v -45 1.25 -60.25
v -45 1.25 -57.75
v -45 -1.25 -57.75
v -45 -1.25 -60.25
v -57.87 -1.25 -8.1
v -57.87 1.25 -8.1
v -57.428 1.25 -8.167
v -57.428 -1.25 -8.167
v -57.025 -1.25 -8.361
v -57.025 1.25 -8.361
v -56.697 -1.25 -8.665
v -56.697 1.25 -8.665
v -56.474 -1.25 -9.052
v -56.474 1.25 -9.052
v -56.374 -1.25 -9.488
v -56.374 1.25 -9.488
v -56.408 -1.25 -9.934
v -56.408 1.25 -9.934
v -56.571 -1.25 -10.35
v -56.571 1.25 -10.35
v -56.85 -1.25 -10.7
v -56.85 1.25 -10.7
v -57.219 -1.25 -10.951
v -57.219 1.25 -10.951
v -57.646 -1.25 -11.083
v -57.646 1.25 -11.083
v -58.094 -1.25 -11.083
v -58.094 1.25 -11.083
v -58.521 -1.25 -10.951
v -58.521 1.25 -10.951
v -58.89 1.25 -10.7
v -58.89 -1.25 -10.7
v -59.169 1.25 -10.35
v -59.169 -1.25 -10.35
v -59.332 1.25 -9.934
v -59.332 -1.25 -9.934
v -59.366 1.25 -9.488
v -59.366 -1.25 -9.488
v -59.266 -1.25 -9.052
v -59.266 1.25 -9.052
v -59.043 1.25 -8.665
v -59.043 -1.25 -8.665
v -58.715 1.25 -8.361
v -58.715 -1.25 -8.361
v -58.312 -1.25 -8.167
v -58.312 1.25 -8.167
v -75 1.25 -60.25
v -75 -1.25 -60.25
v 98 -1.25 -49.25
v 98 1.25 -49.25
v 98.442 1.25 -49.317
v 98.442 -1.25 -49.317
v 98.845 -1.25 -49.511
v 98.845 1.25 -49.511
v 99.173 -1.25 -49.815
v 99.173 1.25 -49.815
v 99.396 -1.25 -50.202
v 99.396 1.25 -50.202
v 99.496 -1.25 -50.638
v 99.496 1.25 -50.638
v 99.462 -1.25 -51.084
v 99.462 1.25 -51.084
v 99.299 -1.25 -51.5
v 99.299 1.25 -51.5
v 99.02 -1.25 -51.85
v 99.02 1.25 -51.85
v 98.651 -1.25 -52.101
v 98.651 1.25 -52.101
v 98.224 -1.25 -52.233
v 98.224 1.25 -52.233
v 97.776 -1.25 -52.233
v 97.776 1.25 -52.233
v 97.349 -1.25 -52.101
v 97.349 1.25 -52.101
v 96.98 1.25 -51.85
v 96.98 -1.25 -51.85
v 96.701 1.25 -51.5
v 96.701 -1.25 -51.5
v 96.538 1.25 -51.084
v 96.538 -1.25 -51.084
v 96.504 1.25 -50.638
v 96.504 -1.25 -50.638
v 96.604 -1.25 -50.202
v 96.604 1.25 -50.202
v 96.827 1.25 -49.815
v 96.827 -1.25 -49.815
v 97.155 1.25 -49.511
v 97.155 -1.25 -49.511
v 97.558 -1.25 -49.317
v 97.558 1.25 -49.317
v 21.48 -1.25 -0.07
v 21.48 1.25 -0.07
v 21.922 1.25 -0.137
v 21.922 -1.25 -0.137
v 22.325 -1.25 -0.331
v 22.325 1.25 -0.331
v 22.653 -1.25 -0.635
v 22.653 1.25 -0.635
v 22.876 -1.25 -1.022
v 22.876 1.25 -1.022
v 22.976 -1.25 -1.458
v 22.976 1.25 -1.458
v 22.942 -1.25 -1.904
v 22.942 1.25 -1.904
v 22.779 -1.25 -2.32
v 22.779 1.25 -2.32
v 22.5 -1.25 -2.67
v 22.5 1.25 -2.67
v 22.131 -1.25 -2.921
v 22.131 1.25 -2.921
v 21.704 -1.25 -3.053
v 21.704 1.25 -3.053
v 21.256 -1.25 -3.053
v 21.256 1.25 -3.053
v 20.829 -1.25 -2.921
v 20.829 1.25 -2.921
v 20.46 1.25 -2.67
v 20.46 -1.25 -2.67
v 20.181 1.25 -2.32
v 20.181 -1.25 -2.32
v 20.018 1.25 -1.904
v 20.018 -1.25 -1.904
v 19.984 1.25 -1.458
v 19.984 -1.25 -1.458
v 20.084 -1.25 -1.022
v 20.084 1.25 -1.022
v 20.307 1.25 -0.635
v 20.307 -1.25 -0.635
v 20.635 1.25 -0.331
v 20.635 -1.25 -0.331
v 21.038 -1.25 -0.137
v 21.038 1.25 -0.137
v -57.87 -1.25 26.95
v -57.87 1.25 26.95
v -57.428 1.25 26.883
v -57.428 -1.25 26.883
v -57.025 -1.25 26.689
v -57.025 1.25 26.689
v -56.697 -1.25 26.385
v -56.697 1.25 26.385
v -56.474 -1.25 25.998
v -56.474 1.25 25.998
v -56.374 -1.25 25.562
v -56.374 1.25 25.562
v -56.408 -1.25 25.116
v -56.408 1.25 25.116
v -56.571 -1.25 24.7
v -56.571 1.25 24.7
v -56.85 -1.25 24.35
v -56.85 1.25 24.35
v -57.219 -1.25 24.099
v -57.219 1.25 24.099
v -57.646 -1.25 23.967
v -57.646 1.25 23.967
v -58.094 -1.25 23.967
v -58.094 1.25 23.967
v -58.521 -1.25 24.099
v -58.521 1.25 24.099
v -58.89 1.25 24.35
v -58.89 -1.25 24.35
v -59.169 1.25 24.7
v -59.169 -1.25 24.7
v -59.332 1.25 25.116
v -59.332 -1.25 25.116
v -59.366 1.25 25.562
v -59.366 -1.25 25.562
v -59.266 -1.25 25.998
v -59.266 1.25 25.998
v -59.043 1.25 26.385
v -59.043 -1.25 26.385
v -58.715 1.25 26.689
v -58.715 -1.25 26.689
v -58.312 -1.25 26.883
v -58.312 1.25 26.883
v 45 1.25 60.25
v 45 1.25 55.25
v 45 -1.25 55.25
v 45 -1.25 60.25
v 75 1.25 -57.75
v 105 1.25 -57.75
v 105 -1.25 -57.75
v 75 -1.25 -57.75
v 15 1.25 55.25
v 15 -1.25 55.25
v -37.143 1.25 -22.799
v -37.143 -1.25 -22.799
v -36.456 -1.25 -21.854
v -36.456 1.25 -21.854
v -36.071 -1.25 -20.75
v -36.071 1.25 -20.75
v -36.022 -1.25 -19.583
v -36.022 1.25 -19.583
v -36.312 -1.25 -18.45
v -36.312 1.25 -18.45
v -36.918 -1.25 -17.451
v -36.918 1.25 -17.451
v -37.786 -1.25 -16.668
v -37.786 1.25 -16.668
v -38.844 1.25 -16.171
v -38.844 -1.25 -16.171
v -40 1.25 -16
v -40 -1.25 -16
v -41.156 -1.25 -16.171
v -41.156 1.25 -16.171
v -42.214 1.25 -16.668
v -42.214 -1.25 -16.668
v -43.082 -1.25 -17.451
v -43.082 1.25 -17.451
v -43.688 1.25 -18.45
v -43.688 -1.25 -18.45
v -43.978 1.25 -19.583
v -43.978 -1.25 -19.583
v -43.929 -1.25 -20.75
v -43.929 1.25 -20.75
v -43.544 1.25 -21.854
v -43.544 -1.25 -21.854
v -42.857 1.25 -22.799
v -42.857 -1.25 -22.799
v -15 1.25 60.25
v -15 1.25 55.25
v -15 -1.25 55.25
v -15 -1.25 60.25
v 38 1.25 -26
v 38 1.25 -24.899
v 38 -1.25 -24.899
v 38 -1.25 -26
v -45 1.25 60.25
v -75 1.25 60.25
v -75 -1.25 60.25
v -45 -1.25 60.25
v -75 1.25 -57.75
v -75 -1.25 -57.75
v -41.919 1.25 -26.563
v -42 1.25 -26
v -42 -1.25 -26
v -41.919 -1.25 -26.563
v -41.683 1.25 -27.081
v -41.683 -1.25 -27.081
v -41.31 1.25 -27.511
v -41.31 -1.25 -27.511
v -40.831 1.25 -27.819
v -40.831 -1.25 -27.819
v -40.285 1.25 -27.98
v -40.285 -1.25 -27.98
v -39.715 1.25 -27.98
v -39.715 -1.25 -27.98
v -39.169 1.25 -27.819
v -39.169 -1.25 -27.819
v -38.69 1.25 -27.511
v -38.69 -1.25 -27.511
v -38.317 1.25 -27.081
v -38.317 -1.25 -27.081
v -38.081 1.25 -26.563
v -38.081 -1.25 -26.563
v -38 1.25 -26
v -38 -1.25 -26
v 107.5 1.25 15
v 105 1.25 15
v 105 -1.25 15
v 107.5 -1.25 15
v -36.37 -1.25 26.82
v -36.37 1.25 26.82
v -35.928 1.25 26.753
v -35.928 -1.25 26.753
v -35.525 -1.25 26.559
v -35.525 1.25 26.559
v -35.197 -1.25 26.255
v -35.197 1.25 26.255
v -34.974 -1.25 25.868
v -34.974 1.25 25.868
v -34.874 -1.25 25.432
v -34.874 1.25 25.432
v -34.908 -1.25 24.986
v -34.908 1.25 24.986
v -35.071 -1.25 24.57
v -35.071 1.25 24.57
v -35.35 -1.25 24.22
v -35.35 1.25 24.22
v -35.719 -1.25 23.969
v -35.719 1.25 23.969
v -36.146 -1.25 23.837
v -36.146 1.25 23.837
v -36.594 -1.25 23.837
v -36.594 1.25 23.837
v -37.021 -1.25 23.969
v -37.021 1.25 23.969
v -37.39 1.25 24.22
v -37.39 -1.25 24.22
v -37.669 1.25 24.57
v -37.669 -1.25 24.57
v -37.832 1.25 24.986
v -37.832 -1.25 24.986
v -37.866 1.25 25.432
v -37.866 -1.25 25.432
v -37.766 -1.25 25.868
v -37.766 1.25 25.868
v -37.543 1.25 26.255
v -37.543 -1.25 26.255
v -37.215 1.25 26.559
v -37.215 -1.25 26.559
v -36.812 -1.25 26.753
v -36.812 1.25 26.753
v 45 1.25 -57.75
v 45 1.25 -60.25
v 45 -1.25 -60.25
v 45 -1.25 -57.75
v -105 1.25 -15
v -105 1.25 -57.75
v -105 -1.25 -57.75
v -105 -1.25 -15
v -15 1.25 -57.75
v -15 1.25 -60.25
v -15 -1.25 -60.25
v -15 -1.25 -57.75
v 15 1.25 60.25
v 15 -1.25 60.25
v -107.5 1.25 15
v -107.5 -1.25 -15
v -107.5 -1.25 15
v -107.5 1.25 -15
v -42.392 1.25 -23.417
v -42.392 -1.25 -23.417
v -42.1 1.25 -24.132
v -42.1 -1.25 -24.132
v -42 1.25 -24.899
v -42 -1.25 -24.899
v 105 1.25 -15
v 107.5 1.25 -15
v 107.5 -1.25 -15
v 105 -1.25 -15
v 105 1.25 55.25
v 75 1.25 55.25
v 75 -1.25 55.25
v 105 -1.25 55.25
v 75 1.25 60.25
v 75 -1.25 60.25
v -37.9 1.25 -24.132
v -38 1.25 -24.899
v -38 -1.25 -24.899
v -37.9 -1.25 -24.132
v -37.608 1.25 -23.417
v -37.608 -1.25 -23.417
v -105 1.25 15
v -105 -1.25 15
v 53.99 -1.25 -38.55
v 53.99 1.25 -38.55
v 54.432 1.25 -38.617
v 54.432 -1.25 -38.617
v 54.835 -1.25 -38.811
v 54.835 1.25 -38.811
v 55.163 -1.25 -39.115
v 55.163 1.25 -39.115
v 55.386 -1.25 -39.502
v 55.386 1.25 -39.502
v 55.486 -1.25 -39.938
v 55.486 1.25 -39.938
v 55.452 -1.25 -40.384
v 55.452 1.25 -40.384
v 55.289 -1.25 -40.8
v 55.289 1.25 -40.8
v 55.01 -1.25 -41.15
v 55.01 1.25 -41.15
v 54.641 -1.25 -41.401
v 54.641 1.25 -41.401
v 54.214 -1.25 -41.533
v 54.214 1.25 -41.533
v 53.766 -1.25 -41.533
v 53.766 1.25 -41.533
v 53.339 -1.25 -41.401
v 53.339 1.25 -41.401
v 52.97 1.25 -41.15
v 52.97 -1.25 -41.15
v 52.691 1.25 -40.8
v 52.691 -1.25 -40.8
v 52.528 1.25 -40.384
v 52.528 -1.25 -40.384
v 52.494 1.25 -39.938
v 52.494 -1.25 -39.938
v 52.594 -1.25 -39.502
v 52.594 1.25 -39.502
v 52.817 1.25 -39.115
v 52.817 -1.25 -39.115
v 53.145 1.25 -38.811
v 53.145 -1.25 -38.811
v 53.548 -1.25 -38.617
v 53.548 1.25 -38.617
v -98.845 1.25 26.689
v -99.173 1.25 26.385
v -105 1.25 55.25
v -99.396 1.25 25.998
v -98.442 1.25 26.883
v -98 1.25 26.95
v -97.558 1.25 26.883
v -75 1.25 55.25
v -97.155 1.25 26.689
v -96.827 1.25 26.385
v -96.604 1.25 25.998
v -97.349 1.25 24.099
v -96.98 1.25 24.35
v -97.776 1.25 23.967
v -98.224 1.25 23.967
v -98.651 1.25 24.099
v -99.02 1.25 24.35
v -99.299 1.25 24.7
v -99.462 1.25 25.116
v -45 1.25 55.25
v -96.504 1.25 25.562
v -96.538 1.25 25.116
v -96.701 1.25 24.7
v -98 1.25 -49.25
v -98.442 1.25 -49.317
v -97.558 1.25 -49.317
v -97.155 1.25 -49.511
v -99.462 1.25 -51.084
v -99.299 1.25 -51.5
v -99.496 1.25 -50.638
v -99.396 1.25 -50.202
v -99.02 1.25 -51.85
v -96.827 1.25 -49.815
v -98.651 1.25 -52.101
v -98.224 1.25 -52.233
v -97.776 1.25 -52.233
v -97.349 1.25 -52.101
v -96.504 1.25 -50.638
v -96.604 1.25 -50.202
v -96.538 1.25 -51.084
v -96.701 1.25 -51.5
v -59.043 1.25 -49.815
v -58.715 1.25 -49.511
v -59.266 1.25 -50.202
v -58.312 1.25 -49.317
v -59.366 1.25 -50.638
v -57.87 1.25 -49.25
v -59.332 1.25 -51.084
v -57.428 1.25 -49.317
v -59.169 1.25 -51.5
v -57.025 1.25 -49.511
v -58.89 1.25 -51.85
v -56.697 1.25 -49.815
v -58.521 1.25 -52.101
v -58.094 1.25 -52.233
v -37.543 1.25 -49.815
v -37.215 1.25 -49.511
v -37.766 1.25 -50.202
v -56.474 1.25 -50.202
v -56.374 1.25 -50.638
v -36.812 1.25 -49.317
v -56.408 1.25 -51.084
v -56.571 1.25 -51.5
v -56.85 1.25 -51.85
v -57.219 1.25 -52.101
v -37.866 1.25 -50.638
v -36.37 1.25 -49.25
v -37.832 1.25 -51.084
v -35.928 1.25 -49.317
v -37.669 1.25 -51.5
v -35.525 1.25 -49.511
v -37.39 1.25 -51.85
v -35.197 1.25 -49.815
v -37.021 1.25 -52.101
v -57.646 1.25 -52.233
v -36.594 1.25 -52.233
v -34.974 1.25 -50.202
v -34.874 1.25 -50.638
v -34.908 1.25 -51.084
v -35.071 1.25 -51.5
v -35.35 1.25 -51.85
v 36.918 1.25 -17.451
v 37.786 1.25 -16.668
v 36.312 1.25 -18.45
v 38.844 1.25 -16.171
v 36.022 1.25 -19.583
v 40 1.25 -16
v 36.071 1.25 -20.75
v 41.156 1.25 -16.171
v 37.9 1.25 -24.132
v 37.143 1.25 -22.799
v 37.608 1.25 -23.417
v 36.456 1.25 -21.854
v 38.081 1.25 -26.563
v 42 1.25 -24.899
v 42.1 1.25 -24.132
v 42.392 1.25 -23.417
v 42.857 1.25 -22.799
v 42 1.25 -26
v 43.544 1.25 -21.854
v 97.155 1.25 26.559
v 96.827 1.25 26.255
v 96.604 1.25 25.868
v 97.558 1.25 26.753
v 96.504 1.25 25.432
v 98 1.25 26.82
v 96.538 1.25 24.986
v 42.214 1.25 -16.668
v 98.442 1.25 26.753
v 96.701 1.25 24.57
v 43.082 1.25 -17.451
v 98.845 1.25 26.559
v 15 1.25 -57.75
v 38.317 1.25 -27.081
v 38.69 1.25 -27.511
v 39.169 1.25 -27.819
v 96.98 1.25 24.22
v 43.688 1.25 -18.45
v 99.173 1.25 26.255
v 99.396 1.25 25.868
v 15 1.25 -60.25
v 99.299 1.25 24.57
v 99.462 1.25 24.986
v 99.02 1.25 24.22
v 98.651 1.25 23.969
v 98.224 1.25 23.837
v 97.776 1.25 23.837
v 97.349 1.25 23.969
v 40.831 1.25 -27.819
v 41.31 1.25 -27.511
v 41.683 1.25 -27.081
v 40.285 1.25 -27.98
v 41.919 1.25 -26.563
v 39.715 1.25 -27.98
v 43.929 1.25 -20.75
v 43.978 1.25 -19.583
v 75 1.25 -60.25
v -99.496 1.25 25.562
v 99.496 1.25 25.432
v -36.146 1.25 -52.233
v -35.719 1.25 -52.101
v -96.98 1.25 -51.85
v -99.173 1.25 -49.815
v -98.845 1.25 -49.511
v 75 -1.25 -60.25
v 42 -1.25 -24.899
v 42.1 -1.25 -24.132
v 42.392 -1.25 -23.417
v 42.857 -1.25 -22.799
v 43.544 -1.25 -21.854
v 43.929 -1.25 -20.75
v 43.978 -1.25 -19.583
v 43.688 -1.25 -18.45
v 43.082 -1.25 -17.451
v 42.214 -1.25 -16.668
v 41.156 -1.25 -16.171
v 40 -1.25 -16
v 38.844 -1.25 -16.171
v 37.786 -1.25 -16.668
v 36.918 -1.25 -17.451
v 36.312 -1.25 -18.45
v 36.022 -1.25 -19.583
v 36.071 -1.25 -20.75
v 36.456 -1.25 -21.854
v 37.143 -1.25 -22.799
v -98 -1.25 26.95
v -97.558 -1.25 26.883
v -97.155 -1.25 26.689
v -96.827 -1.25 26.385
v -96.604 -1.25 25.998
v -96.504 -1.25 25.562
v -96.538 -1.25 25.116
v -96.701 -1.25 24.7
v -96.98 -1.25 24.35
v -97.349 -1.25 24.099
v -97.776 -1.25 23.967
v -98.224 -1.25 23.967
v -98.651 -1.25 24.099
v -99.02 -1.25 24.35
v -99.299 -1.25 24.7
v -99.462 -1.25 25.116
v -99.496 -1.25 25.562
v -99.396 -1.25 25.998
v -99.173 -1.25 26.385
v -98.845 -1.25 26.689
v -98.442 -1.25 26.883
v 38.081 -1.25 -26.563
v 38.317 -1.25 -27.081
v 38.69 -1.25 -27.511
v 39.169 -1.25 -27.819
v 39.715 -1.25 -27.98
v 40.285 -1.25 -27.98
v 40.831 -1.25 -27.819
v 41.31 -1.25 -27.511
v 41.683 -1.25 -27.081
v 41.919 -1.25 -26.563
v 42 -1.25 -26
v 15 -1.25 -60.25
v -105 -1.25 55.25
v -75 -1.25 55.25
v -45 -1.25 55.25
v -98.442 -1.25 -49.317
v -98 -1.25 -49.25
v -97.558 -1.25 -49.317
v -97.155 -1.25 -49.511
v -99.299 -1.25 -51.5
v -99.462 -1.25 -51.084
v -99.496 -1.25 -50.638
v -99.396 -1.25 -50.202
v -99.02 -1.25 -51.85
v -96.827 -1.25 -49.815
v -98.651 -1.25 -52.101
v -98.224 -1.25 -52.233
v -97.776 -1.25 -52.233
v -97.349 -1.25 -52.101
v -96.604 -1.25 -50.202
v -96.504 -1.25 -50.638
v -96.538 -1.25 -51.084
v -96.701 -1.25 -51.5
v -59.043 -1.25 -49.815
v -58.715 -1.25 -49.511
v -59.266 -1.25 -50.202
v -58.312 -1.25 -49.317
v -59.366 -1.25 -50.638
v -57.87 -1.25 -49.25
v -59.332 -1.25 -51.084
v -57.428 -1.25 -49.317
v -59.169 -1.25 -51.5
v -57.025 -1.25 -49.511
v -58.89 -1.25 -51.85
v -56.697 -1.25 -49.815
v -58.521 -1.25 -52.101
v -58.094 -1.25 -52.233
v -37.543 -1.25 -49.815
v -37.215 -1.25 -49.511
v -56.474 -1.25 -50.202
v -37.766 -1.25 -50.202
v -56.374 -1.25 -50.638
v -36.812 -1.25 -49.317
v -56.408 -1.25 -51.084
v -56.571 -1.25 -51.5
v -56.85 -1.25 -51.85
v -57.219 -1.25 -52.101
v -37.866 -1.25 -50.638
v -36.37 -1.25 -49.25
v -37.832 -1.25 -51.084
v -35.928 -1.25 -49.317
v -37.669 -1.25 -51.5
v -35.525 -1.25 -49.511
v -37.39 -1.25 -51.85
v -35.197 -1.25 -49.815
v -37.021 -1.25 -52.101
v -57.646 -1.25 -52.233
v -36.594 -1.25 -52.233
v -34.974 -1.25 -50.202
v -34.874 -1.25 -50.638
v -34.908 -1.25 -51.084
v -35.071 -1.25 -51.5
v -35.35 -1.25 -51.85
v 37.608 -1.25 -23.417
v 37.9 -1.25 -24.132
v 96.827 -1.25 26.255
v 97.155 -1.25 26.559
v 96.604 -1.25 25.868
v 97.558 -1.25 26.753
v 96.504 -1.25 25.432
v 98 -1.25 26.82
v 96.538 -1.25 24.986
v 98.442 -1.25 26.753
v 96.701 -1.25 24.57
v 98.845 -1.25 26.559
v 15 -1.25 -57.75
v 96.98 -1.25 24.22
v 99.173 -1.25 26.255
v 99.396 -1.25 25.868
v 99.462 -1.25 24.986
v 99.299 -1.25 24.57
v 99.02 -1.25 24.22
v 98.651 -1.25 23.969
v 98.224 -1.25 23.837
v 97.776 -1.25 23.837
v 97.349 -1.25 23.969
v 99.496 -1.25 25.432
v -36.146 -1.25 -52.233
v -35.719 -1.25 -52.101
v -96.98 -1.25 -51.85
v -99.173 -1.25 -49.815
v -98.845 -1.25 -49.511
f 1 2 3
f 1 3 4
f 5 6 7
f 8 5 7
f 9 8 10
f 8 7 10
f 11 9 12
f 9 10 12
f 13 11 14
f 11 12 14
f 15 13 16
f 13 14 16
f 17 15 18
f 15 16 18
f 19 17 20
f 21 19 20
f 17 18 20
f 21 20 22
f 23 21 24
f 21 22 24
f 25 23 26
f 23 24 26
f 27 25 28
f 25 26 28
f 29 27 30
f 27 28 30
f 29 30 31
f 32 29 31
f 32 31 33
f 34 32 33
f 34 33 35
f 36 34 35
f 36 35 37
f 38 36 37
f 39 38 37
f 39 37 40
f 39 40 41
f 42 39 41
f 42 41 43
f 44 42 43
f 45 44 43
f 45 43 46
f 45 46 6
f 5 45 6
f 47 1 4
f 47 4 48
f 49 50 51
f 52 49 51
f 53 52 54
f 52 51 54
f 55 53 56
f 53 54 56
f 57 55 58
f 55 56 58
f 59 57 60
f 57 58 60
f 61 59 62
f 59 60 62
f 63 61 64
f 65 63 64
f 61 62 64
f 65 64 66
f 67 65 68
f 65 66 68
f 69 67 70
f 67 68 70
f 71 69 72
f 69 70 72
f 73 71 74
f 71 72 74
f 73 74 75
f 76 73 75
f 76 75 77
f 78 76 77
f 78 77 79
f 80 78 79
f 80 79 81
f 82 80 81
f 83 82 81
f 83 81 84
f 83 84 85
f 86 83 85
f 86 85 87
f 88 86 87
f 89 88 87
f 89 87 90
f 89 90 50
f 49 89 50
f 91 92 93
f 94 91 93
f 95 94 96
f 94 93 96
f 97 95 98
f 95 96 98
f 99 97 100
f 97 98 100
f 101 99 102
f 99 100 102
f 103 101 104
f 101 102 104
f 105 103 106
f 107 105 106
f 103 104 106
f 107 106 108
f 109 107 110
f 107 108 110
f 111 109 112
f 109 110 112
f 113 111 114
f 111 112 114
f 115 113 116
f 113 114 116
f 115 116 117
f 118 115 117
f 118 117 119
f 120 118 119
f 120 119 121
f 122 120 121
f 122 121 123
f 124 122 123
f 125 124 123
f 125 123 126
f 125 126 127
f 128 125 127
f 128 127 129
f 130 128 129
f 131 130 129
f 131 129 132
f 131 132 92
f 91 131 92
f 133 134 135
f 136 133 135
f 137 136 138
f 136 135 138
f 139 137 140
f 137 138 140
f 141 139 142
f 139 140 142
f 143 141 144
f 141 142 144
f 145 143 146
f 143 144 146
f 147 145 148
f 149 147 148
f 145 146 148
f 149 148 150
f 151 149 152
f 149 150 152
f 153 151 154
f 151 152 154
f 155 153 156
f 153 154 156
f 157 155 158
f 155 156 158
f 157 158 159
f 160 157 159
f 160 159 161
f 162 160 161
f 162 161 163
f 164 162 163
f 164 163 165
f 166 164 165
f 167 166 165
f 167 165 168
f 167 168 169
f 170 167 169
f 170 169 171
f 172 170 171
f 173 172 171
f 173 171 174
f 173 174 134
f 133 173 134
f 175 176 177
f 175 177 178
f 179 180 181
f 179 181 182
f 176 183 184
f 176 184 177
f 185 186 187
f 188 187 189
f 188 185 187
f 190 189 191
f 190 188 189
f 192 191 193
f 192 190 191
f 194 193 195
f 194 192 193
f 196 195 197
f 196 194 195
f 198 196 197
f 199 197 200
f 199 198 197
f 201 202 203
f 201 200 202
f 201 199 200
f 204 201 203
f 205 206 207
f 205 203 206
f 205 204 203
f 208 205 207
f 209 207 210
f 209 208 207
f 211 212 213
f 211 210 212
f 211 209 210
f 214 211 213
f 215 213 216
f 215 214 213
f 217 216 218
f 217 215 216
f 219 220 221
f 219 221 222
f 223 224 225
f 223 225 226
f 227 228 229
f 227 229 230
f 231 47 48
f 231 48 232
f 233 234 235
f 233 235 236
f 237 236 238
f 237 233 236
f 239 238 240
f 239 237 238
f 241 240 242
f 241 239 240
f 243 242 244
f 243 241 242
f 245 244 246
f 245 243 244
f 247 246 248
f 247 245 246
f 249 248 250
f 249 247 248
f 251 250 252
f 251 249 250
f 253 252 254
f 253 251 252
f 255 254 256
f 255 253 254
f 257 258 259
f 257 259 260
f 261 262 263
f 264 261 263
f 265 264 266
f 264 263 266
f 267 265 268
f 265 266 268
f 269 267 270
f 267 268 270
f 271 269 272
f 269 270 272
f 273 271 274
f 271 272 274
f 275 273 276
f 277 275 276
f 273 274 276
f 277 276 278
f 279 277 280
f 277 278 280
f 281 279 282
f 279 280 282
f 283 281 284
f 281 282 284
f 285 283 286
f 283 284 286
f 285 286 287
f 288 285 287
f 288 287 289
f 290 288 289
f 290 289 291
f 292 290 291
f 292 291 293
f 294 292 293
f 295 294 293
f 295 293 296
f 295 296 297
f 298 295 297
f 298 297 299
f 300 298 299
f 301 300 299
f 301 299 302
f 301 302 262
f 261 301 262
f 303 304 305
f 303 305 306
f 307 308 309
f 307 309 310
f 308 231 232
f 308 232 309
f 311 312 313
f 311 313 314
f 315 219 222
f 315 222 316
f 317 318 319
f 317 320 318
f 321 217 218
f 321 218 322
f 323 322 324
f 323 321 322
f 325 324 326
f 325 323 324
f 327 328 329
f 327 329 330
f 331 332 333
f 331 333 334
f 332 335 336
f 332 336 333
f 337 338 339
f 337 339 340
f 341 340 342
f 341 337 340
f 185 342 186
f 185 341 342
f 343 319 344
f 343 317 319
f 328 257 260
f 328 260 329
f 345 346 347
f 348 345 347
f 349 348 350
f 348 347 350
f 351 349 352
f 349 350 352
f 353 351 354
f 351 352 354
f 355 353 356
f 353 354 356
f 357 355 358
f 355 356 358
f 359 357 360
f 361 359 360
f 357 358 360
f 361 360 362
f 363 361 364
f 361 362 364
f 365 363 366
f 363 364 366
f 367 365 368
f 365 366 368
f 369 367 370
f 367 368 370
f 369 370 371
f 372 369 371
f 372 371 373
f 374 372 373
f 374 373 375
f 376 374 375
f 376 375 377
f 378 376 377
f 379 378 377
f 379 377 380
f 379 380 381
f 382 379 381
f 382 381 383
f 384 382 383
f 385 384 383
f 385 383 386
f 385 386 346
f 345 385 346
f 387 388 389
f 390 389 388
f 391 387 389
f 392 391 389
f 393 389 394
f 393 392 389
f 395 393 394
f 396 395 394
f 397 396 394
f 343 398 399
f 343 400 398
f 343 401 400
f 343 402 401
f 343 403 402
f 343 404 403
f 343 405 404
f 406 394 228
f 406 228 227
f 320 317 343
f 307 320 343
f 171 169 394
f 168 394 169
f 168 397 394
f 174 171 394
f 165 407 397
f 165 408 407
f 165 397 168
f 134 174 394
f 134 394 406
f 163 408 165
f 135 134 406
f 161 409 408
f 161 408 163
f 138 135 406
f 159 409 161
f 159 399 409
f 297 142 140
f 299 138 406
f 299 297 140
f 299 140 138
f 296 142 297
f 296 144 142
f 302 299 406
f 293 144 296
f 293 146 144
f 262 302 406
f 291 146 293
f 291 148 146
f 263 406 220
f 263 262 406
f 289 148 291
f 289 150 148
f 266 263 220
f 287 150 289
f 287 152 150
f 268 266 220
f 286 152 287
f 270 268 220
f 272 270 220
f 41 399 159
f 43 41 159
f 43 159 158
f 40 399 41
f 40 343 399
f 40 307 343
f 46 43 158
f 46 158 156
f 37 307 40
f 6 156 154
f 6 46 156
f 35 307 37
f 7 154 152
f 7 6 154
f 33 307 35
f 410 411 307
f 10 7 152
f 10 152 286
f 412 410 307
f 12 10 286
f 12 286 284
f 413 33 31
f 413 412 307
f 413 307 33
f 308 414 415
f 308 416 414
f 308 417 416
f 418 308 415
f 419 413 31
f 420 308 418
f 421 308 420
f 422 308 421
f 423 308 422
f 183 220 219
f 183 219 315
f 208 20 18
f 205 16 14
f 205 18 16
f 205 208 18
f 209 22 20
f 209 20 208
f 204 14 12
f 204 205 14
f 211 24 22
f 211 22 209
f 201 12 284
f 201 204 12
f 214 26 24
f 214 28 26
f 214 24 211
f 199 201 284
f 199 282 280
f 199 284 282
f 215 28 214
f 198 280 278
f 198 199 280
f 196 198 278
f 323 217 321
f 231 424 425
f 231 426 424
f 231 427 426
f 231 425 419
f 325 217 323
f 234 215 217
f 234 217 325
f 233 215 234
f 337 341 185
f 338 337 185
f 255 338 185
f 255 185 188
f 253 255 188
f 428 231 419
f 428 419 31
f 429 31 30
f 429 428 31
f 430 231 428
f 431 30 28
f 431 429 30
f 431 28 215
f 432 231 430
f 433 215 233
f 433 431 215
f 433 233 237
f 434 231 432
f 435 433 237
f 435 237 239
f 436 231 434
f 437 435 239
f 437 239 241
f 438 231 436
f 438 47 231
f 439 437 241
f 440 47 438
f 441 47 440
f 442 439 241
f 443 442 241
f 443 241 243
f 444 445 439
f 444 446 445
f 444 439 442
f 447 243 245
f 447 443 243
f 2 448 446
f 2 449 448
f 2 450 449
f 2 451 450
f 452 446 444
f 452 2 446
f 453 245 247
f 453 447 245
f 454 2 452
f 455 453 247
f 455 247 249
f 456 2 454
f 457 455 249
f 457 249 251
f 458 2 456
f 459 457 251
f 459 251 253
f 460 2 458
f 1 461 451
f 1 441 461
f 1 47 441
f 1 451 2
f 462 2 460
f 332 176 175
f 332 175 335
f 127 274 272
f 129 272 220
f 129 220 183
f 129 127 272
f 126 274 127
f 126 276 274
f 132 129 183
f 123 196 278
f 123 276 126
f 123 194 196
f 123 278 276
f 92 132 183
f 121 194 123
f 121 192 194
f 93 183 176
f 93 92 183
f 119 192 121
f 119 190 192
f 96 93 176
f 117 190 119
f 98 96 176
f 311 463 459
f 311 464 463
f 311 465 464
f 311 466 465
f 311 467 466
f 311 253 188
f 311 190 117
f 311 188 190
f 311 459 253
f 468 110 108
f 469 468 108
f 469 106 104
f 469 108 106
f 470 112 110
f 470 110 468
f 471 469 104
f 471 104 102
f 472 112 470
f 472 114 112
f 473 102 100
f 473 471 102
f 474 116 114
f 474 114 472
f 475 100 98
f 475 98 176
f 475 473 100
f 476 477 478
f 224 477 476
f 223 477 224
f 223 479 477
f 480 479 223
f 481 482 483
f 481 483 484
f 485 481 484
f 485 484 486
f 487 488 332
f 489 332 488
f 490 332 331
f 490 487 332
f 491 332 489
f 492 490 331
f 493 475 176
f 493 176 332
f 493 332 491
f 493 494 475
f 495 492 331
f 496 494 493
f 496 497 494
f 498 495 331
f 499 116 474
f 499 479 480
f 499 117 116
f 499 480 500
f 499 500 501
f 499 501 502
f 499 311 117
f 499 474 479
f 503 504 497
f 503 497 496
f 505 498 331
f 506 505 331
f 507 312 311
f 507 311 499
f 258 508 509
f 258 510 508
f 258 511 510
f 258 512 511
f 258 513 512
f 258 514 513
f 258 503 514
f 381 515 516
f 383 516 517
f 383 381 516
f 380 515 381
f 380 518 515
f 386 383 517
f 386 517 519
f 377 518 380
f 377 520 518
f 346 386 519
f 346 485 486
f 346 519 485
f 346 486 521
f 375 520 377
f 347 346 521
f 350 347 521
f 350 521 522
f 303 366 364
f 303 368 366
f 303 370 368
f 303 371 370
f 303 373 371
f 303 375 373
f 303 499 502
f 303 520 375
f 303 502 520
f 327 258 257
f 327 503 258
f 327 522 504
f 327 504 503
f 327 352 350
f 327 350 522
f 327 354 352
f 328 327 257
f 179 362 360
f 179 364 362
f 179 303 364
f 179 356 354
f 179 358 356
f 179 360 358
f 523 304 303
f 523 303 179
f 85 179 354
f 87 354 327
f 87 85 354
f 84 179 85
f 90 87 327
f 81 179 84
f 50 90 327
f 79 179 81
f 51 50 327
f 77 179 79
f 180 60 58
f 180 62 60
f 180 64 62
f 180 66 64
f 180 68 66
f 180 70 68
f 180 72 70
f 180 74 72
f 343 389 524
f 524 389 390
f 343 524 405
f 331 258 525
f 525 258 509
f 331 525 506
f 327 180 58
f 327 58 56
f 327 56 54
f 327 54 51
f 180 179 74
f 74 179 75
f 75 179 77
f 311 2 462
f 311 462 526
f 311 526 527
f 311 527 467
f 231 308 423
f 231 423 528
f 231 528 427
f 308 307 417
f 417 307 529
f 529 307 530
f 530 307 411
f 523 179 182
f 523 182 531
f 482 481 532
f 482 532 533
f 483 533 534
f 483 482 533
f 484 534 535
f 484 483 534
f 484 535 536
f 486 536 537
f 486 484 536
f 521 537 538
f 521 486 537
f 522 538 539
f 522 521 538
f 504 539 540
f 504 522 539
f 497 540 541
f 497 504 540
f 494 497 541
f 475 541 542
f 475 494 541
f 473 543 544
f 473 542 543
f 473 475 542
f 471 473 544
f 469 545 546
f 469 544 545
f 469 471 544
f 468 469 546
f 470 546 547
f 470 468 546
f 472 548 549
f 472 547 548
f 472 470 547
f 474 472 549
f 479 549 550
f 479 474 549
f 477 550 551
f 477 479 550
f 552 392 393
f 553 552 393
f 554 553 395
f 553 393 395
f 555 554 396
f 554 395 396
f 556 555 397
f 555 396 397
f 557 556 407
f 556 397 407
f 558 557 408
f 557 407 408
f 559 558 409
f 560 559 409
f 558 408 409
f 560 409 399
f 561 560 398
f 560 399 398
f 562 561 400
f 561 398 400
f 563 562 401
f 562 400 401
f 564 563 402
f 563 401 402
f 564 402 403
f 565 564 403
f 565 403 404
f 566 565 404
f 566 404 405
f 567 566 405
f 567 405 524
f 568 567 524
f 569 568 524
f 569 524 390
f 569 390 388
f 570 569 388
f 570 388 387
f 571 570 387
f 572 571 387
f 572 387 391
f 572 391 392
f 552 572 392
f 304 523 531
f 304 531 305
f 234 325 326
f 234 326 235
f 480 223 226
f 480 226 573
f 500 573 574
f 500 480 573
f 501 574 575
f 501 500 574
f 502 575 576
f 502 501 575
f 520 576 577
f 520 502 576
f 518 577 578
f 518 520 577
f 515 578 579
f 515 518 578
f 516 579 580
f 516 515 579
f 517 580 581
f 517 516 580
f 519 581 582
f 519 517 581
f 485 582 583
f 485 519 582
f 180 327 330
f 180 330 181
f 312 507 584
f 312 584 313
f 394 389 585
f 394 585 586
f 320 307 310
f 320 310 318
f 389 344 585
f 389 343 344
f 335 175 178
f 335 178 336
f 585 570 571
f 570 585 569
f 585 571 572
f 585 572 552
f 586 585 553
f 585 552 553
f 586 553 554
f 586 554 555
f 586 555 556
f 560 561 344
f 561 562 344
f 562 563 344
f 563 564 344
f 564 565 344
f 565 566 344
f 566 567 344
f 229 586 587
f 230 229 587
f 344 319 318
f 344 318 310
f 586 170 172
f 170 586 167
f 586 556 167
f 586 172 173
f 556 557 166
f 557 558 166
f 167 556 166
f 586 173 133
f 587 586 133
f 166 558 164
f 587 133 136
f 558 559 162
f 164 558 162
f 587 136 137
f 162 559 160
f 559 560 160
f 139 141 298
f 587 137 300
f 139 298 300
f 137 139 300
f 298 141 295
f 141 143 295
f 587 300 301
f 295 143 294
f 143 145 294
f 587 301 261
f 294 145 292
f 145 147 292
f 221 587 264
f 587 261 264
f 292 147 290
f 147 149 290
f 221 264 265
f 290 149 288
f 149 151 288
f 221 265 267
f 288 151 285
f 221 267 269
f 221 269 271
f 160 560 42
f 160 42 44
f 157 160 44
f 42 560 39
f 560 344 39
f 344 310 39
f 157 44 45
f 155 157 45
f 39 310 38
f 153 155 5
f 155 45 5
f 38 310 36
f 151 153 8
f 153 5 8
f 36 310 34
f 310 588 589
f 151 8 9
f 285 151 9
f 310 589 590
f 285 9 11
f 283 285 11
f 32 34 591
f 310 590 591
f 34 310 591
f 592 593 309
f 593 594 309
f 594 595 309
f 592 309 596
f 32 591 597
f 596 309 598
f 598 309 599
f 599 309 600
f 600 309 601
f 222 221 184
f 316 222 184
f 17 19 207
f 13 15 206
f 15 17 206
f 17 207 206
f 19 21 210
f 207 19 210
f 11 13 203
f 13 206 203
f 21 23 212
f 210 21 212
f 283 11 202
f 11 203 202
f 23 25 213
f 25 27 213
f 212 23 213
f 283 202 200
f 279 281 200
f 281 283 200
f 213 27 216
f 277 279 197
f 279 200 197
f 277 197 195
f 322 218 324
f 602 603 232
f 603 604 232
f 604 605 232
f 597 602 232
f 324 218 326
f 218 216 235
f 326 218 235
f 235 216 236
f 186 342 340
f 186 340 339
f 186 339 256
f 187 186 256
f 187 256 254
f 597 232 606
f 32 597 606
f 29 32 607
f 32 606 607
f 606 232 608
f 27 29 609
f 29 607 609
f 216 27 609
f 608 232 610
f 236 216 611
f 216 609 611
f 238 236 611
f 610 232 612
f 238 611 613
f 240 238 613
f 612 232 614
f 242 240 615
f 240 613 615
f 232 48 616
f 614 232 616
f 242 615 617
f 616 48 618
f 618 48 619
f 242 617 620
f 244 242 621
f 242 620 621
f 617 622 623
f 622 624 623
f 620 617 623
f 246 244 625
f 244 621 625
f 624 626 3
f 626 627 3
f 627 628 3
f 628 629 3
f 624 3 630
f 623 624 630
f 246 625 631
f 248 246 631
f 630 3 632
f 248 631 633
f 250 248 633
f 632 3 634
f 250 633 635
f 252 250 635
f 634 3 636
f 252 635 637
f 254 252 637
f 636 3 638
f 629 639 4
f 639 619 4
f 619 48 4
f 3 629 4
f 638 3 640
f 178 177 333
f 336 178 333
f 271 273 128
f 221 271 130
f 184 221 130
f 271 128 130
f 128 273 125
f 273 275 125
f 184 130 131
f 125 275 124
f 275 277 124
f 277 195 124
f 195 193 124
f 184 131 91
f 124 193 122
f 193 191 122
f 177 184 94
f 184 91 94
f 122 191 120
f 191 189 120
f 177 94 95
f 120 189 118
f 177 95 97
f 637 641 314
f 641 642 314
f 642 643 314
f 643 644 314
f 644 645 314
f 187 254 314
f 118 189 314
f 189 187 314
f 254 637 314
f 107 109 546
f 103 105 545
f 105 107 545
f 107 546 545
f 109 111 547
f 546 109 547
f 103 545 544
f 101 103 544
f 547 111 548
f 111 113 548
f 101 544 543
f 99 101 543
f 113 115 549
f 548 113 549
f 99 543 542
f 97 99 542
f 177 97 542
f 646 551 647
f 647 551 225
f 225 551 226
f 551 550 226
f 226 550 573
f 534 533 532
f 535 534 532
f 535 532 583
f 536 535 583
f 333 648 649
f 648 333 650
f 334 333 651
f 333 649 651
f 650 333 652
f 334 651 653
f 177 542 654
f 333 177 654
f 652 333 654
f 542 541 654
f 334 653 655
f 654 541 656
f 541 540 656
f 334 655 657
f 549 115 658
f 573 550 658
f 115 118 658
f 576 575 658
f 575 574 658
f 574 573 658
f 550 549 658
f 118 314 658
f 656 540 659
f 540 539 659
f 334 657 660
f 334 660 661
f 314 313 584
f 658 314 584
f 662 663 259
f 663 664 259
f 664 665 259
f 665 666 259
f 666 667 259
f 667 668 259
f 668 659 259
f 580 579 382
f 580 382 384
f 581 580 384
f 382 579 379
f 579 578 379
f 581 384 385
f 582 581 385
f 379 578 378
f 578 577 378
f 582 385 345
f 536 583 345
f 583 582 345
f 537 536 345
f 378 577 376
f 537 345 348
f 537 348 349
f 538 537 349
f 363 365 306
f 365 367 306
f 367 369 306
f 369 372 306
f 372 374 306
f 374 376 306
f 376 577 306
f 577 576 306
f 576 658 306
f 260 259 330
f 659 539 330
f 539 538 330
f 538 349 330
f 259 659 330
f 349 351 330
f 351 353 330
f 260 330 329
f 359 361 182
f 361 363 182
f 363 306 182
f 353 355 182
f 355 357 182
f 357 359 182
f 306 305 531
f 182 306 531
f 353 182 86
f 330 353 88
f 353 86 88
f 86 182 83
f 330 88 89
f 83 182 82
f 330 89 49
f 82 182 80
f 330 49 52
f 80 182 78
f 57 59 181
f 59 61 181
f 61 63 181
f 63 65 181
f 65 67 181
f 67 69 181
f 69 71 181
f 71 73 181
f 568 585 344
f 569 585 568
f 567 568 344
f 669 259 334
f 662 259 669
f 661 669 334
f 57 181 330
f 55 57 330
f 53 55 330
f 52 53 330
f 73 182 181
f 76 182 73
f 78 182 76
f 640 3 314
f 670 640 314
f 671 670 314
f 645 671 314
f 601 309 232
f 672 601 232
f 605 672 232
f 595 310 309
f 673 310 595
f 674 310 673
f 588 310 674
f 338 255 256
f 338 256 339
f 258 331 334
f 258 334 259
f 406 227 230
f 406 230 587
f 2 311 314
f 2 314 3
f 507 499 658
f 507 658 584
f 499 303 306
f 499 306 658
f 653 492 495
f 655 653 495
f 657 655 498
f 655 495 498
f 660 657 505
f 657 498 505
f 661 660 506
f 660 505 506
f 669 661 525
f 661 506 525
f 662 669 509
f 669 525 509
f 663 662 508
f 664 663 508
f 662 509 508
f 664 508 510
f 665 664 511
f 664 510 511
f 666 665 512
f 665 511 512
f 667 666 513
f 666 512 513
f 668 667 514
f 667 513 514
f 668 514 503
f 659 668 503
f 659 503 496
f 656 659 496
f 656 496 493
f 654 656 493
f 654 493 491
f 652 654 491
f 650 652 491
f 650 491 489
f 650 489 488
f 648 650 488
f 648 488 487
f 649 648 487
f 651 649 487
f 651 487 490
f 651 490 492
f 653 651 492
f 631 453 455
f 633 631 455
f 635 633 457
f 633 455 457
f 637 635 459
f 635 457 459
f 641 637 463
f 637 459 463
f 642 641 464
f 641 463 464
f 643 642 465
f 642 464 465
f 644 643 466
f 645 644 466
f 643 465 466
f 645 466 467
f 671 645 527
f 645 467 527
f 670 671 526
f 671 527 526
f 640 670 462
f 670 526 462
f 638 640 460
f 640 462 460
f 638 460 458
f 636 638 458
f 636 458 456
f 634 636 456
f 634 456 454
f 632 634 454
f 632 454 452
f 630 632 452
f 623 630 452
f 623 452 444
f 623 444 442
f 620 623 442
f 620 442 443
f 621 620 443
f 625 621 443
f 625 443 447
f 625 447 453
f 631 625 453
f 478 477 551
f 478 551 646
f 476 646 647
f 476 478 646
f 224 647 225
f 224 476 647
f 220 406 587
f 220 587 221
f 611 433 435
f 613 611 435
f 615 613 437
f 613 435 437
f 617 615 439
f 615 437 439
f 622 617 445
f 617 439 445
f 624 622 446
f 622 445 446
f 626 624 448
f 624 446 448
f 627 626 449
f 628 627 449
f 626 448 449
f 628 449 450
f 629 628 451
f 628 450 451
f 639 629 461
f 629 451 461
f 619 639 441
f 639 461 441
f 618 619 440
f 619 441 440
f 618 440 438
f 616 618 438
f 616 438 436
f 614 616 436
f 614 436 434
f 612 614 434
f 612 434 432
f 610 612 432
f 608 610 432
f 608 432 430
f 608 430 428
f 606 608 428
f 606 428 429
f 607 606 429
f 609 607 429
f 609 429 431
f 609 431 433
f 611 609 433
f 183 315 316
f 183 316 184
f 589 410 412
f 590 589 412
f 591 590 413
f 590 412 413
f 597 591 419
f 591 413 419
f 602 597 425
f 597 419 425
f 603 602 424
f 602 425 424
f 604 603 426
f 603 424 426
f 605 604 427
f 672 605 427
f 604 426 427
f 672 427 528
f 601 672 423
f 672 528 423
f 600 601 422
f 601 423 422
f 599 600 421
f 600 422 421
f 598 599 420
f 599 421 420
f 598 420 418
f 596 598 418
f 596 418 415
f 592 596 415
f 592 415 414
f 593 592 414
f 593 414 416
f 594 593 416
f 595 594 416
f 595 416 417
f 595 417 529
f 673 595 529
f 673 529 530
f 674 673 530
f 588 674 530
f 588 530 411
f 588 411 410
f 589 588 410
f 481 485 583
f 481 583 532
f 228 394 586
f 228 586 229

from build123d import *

# Parameters (mm, degrees)
BOSS_EXTRUDE2_DEPTH = 1.25
SKETCH5_R           = 1.5
CUT_EXTRUDE3_DEPTH  = 124.258113323


with BuildPart() as part:
    # Sketch2<4> → Boss-Extrude2 (new, symmetric)
    with BuildSketch(Plane(origin=(0, 0, 0), x_dir=(1, 0, 0), z_dir=(0, 1, 0))):
        Polygon((-105, -15), (-105, -55.25), (-75, -55.25), (-75, -60.25), (-45, -60.25), (-45, -55.25), (-15, -55.25), (-15, -60.25), (15, -60.25), (15, -55.25), (45, -55.25), (45, -60.25), (75, -60.25), (75, -55.25), (105, -55.25), (105, -15), (107.5, -15), (107.5, 15), (105, 15), (105, 57.75), (75, 57.75), (75, 60.25), (45, 60.25), (45, 57.75), (15, 57.75), (15, 60.25), (-15, 60.25), (-15, 57.75), (-45, 57.75), (-45, 60.25), (-75, 60.25), (-75, 57.75), (-105, 57.75), (-105, 15), (-107.5, 15), (-107.5, -15), align=None)
    extrude(amount=BOSS_EXTRUDE2_DEPTH, both=True)

    # Sketch5 → Cut-Extrude3 (cut, through all)
    with BuildSketch(Plane(origin=(0, 1.25, 0), x_dir=(1, 0, 0), z_dir=(0, 1, 0))):
        with Locations((98, 50.75)):
            Circle(SKETCH5_R)
        with Locations((-36.37, 50.75)):
            Circle(SKETCH5_R)
        with Locations((-36.37, -25.32)):
            Circle(SKETCH5_R)
        with Locations((98, -25.32)):
            Circle(SKETCH5_R)
        with Locations((53.99, 40.05)):
            Circle(SKETCH5_R)
        with Locations((21.48, 1.57)):
            Circle(SKETCH5_R)
        with Locations((-98, 50.75)):
            Circle(SKETCH5_R)
        with Locations((-57.87, 50.75)):
            Circle(SKETCH5_R)
        with Locations((-98, -25.45)):
            Circle(SKETCH5_R)
        with Locations((-57.87, -25.45)):
            Circle(SKETCH5_R)
        with Locations((-57.87, 9.6)):
            Circle(SKETCH5_R)
        with BuildLine():
            Line((-38, 26), (-38, 24.898979486))
            ThreePointArc((-38, 24.898979486), (-37.777460299, 23.765086067), (-37.142857143, 22.799416849))
            ThreePointArc((-37.142857143, 22.799416849), (-40, 16), (-42.857142857, 22.799416849))
            ThreePointArc((-42.857142857, 22.799416849), (-42.222539701, 23.765086067), (-42, 24.898979486))
            Line((-42, 24.898979486), (-42, 26))
            ThreePointArc((-42, 26), (-40, 28), (-38, 26))
        make_face()
        with BuildLine():
            Line((42, 26), (42, 24.898979486))
            ThreePointArc((42, 24.898979486), (42.222539701, 23.765086067), (42.857142857, 22.799416849))
            ThreePointArc((42.857142857, 22.799416849), (40, 16), (37.142857143, 22.799416849))
            ThreePointArc((37.142857143, 22.799416849), (37.777460299, 23.765086067), (38, 24.898979486))
            Line((38, 24.898979486), (38, 26))
            ThreePointArc((38, 26), (40, 28), (42, 26))
        make_face()
    extrude(amount=-CUT_EXTRUDE3_DEPTH, mode=Mode.SUBTRACT)


solid = part.part
